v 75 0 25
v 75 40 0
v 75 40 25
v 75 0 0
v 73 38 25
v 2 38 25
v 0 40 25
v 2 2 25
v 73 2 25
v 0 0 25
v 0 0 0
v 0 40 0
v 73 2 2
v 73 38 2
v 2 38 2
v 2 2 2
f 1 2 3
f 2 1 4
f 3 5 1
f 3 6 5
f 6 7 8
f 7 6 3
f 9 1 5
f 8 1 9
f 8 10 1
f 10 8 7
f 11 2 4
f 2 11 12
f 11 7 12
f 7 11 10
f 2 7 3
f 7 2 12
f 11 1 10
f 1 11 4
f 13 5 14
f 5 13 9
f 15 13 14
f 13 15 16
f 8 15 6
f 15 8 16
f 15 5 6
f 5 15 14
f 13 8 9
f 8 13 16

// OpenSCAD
module lipo3s(){
  difference(){ cube([75,40,25]); translate([2,2,2]) cube([71,36,25]); }
}
lipo3s();
